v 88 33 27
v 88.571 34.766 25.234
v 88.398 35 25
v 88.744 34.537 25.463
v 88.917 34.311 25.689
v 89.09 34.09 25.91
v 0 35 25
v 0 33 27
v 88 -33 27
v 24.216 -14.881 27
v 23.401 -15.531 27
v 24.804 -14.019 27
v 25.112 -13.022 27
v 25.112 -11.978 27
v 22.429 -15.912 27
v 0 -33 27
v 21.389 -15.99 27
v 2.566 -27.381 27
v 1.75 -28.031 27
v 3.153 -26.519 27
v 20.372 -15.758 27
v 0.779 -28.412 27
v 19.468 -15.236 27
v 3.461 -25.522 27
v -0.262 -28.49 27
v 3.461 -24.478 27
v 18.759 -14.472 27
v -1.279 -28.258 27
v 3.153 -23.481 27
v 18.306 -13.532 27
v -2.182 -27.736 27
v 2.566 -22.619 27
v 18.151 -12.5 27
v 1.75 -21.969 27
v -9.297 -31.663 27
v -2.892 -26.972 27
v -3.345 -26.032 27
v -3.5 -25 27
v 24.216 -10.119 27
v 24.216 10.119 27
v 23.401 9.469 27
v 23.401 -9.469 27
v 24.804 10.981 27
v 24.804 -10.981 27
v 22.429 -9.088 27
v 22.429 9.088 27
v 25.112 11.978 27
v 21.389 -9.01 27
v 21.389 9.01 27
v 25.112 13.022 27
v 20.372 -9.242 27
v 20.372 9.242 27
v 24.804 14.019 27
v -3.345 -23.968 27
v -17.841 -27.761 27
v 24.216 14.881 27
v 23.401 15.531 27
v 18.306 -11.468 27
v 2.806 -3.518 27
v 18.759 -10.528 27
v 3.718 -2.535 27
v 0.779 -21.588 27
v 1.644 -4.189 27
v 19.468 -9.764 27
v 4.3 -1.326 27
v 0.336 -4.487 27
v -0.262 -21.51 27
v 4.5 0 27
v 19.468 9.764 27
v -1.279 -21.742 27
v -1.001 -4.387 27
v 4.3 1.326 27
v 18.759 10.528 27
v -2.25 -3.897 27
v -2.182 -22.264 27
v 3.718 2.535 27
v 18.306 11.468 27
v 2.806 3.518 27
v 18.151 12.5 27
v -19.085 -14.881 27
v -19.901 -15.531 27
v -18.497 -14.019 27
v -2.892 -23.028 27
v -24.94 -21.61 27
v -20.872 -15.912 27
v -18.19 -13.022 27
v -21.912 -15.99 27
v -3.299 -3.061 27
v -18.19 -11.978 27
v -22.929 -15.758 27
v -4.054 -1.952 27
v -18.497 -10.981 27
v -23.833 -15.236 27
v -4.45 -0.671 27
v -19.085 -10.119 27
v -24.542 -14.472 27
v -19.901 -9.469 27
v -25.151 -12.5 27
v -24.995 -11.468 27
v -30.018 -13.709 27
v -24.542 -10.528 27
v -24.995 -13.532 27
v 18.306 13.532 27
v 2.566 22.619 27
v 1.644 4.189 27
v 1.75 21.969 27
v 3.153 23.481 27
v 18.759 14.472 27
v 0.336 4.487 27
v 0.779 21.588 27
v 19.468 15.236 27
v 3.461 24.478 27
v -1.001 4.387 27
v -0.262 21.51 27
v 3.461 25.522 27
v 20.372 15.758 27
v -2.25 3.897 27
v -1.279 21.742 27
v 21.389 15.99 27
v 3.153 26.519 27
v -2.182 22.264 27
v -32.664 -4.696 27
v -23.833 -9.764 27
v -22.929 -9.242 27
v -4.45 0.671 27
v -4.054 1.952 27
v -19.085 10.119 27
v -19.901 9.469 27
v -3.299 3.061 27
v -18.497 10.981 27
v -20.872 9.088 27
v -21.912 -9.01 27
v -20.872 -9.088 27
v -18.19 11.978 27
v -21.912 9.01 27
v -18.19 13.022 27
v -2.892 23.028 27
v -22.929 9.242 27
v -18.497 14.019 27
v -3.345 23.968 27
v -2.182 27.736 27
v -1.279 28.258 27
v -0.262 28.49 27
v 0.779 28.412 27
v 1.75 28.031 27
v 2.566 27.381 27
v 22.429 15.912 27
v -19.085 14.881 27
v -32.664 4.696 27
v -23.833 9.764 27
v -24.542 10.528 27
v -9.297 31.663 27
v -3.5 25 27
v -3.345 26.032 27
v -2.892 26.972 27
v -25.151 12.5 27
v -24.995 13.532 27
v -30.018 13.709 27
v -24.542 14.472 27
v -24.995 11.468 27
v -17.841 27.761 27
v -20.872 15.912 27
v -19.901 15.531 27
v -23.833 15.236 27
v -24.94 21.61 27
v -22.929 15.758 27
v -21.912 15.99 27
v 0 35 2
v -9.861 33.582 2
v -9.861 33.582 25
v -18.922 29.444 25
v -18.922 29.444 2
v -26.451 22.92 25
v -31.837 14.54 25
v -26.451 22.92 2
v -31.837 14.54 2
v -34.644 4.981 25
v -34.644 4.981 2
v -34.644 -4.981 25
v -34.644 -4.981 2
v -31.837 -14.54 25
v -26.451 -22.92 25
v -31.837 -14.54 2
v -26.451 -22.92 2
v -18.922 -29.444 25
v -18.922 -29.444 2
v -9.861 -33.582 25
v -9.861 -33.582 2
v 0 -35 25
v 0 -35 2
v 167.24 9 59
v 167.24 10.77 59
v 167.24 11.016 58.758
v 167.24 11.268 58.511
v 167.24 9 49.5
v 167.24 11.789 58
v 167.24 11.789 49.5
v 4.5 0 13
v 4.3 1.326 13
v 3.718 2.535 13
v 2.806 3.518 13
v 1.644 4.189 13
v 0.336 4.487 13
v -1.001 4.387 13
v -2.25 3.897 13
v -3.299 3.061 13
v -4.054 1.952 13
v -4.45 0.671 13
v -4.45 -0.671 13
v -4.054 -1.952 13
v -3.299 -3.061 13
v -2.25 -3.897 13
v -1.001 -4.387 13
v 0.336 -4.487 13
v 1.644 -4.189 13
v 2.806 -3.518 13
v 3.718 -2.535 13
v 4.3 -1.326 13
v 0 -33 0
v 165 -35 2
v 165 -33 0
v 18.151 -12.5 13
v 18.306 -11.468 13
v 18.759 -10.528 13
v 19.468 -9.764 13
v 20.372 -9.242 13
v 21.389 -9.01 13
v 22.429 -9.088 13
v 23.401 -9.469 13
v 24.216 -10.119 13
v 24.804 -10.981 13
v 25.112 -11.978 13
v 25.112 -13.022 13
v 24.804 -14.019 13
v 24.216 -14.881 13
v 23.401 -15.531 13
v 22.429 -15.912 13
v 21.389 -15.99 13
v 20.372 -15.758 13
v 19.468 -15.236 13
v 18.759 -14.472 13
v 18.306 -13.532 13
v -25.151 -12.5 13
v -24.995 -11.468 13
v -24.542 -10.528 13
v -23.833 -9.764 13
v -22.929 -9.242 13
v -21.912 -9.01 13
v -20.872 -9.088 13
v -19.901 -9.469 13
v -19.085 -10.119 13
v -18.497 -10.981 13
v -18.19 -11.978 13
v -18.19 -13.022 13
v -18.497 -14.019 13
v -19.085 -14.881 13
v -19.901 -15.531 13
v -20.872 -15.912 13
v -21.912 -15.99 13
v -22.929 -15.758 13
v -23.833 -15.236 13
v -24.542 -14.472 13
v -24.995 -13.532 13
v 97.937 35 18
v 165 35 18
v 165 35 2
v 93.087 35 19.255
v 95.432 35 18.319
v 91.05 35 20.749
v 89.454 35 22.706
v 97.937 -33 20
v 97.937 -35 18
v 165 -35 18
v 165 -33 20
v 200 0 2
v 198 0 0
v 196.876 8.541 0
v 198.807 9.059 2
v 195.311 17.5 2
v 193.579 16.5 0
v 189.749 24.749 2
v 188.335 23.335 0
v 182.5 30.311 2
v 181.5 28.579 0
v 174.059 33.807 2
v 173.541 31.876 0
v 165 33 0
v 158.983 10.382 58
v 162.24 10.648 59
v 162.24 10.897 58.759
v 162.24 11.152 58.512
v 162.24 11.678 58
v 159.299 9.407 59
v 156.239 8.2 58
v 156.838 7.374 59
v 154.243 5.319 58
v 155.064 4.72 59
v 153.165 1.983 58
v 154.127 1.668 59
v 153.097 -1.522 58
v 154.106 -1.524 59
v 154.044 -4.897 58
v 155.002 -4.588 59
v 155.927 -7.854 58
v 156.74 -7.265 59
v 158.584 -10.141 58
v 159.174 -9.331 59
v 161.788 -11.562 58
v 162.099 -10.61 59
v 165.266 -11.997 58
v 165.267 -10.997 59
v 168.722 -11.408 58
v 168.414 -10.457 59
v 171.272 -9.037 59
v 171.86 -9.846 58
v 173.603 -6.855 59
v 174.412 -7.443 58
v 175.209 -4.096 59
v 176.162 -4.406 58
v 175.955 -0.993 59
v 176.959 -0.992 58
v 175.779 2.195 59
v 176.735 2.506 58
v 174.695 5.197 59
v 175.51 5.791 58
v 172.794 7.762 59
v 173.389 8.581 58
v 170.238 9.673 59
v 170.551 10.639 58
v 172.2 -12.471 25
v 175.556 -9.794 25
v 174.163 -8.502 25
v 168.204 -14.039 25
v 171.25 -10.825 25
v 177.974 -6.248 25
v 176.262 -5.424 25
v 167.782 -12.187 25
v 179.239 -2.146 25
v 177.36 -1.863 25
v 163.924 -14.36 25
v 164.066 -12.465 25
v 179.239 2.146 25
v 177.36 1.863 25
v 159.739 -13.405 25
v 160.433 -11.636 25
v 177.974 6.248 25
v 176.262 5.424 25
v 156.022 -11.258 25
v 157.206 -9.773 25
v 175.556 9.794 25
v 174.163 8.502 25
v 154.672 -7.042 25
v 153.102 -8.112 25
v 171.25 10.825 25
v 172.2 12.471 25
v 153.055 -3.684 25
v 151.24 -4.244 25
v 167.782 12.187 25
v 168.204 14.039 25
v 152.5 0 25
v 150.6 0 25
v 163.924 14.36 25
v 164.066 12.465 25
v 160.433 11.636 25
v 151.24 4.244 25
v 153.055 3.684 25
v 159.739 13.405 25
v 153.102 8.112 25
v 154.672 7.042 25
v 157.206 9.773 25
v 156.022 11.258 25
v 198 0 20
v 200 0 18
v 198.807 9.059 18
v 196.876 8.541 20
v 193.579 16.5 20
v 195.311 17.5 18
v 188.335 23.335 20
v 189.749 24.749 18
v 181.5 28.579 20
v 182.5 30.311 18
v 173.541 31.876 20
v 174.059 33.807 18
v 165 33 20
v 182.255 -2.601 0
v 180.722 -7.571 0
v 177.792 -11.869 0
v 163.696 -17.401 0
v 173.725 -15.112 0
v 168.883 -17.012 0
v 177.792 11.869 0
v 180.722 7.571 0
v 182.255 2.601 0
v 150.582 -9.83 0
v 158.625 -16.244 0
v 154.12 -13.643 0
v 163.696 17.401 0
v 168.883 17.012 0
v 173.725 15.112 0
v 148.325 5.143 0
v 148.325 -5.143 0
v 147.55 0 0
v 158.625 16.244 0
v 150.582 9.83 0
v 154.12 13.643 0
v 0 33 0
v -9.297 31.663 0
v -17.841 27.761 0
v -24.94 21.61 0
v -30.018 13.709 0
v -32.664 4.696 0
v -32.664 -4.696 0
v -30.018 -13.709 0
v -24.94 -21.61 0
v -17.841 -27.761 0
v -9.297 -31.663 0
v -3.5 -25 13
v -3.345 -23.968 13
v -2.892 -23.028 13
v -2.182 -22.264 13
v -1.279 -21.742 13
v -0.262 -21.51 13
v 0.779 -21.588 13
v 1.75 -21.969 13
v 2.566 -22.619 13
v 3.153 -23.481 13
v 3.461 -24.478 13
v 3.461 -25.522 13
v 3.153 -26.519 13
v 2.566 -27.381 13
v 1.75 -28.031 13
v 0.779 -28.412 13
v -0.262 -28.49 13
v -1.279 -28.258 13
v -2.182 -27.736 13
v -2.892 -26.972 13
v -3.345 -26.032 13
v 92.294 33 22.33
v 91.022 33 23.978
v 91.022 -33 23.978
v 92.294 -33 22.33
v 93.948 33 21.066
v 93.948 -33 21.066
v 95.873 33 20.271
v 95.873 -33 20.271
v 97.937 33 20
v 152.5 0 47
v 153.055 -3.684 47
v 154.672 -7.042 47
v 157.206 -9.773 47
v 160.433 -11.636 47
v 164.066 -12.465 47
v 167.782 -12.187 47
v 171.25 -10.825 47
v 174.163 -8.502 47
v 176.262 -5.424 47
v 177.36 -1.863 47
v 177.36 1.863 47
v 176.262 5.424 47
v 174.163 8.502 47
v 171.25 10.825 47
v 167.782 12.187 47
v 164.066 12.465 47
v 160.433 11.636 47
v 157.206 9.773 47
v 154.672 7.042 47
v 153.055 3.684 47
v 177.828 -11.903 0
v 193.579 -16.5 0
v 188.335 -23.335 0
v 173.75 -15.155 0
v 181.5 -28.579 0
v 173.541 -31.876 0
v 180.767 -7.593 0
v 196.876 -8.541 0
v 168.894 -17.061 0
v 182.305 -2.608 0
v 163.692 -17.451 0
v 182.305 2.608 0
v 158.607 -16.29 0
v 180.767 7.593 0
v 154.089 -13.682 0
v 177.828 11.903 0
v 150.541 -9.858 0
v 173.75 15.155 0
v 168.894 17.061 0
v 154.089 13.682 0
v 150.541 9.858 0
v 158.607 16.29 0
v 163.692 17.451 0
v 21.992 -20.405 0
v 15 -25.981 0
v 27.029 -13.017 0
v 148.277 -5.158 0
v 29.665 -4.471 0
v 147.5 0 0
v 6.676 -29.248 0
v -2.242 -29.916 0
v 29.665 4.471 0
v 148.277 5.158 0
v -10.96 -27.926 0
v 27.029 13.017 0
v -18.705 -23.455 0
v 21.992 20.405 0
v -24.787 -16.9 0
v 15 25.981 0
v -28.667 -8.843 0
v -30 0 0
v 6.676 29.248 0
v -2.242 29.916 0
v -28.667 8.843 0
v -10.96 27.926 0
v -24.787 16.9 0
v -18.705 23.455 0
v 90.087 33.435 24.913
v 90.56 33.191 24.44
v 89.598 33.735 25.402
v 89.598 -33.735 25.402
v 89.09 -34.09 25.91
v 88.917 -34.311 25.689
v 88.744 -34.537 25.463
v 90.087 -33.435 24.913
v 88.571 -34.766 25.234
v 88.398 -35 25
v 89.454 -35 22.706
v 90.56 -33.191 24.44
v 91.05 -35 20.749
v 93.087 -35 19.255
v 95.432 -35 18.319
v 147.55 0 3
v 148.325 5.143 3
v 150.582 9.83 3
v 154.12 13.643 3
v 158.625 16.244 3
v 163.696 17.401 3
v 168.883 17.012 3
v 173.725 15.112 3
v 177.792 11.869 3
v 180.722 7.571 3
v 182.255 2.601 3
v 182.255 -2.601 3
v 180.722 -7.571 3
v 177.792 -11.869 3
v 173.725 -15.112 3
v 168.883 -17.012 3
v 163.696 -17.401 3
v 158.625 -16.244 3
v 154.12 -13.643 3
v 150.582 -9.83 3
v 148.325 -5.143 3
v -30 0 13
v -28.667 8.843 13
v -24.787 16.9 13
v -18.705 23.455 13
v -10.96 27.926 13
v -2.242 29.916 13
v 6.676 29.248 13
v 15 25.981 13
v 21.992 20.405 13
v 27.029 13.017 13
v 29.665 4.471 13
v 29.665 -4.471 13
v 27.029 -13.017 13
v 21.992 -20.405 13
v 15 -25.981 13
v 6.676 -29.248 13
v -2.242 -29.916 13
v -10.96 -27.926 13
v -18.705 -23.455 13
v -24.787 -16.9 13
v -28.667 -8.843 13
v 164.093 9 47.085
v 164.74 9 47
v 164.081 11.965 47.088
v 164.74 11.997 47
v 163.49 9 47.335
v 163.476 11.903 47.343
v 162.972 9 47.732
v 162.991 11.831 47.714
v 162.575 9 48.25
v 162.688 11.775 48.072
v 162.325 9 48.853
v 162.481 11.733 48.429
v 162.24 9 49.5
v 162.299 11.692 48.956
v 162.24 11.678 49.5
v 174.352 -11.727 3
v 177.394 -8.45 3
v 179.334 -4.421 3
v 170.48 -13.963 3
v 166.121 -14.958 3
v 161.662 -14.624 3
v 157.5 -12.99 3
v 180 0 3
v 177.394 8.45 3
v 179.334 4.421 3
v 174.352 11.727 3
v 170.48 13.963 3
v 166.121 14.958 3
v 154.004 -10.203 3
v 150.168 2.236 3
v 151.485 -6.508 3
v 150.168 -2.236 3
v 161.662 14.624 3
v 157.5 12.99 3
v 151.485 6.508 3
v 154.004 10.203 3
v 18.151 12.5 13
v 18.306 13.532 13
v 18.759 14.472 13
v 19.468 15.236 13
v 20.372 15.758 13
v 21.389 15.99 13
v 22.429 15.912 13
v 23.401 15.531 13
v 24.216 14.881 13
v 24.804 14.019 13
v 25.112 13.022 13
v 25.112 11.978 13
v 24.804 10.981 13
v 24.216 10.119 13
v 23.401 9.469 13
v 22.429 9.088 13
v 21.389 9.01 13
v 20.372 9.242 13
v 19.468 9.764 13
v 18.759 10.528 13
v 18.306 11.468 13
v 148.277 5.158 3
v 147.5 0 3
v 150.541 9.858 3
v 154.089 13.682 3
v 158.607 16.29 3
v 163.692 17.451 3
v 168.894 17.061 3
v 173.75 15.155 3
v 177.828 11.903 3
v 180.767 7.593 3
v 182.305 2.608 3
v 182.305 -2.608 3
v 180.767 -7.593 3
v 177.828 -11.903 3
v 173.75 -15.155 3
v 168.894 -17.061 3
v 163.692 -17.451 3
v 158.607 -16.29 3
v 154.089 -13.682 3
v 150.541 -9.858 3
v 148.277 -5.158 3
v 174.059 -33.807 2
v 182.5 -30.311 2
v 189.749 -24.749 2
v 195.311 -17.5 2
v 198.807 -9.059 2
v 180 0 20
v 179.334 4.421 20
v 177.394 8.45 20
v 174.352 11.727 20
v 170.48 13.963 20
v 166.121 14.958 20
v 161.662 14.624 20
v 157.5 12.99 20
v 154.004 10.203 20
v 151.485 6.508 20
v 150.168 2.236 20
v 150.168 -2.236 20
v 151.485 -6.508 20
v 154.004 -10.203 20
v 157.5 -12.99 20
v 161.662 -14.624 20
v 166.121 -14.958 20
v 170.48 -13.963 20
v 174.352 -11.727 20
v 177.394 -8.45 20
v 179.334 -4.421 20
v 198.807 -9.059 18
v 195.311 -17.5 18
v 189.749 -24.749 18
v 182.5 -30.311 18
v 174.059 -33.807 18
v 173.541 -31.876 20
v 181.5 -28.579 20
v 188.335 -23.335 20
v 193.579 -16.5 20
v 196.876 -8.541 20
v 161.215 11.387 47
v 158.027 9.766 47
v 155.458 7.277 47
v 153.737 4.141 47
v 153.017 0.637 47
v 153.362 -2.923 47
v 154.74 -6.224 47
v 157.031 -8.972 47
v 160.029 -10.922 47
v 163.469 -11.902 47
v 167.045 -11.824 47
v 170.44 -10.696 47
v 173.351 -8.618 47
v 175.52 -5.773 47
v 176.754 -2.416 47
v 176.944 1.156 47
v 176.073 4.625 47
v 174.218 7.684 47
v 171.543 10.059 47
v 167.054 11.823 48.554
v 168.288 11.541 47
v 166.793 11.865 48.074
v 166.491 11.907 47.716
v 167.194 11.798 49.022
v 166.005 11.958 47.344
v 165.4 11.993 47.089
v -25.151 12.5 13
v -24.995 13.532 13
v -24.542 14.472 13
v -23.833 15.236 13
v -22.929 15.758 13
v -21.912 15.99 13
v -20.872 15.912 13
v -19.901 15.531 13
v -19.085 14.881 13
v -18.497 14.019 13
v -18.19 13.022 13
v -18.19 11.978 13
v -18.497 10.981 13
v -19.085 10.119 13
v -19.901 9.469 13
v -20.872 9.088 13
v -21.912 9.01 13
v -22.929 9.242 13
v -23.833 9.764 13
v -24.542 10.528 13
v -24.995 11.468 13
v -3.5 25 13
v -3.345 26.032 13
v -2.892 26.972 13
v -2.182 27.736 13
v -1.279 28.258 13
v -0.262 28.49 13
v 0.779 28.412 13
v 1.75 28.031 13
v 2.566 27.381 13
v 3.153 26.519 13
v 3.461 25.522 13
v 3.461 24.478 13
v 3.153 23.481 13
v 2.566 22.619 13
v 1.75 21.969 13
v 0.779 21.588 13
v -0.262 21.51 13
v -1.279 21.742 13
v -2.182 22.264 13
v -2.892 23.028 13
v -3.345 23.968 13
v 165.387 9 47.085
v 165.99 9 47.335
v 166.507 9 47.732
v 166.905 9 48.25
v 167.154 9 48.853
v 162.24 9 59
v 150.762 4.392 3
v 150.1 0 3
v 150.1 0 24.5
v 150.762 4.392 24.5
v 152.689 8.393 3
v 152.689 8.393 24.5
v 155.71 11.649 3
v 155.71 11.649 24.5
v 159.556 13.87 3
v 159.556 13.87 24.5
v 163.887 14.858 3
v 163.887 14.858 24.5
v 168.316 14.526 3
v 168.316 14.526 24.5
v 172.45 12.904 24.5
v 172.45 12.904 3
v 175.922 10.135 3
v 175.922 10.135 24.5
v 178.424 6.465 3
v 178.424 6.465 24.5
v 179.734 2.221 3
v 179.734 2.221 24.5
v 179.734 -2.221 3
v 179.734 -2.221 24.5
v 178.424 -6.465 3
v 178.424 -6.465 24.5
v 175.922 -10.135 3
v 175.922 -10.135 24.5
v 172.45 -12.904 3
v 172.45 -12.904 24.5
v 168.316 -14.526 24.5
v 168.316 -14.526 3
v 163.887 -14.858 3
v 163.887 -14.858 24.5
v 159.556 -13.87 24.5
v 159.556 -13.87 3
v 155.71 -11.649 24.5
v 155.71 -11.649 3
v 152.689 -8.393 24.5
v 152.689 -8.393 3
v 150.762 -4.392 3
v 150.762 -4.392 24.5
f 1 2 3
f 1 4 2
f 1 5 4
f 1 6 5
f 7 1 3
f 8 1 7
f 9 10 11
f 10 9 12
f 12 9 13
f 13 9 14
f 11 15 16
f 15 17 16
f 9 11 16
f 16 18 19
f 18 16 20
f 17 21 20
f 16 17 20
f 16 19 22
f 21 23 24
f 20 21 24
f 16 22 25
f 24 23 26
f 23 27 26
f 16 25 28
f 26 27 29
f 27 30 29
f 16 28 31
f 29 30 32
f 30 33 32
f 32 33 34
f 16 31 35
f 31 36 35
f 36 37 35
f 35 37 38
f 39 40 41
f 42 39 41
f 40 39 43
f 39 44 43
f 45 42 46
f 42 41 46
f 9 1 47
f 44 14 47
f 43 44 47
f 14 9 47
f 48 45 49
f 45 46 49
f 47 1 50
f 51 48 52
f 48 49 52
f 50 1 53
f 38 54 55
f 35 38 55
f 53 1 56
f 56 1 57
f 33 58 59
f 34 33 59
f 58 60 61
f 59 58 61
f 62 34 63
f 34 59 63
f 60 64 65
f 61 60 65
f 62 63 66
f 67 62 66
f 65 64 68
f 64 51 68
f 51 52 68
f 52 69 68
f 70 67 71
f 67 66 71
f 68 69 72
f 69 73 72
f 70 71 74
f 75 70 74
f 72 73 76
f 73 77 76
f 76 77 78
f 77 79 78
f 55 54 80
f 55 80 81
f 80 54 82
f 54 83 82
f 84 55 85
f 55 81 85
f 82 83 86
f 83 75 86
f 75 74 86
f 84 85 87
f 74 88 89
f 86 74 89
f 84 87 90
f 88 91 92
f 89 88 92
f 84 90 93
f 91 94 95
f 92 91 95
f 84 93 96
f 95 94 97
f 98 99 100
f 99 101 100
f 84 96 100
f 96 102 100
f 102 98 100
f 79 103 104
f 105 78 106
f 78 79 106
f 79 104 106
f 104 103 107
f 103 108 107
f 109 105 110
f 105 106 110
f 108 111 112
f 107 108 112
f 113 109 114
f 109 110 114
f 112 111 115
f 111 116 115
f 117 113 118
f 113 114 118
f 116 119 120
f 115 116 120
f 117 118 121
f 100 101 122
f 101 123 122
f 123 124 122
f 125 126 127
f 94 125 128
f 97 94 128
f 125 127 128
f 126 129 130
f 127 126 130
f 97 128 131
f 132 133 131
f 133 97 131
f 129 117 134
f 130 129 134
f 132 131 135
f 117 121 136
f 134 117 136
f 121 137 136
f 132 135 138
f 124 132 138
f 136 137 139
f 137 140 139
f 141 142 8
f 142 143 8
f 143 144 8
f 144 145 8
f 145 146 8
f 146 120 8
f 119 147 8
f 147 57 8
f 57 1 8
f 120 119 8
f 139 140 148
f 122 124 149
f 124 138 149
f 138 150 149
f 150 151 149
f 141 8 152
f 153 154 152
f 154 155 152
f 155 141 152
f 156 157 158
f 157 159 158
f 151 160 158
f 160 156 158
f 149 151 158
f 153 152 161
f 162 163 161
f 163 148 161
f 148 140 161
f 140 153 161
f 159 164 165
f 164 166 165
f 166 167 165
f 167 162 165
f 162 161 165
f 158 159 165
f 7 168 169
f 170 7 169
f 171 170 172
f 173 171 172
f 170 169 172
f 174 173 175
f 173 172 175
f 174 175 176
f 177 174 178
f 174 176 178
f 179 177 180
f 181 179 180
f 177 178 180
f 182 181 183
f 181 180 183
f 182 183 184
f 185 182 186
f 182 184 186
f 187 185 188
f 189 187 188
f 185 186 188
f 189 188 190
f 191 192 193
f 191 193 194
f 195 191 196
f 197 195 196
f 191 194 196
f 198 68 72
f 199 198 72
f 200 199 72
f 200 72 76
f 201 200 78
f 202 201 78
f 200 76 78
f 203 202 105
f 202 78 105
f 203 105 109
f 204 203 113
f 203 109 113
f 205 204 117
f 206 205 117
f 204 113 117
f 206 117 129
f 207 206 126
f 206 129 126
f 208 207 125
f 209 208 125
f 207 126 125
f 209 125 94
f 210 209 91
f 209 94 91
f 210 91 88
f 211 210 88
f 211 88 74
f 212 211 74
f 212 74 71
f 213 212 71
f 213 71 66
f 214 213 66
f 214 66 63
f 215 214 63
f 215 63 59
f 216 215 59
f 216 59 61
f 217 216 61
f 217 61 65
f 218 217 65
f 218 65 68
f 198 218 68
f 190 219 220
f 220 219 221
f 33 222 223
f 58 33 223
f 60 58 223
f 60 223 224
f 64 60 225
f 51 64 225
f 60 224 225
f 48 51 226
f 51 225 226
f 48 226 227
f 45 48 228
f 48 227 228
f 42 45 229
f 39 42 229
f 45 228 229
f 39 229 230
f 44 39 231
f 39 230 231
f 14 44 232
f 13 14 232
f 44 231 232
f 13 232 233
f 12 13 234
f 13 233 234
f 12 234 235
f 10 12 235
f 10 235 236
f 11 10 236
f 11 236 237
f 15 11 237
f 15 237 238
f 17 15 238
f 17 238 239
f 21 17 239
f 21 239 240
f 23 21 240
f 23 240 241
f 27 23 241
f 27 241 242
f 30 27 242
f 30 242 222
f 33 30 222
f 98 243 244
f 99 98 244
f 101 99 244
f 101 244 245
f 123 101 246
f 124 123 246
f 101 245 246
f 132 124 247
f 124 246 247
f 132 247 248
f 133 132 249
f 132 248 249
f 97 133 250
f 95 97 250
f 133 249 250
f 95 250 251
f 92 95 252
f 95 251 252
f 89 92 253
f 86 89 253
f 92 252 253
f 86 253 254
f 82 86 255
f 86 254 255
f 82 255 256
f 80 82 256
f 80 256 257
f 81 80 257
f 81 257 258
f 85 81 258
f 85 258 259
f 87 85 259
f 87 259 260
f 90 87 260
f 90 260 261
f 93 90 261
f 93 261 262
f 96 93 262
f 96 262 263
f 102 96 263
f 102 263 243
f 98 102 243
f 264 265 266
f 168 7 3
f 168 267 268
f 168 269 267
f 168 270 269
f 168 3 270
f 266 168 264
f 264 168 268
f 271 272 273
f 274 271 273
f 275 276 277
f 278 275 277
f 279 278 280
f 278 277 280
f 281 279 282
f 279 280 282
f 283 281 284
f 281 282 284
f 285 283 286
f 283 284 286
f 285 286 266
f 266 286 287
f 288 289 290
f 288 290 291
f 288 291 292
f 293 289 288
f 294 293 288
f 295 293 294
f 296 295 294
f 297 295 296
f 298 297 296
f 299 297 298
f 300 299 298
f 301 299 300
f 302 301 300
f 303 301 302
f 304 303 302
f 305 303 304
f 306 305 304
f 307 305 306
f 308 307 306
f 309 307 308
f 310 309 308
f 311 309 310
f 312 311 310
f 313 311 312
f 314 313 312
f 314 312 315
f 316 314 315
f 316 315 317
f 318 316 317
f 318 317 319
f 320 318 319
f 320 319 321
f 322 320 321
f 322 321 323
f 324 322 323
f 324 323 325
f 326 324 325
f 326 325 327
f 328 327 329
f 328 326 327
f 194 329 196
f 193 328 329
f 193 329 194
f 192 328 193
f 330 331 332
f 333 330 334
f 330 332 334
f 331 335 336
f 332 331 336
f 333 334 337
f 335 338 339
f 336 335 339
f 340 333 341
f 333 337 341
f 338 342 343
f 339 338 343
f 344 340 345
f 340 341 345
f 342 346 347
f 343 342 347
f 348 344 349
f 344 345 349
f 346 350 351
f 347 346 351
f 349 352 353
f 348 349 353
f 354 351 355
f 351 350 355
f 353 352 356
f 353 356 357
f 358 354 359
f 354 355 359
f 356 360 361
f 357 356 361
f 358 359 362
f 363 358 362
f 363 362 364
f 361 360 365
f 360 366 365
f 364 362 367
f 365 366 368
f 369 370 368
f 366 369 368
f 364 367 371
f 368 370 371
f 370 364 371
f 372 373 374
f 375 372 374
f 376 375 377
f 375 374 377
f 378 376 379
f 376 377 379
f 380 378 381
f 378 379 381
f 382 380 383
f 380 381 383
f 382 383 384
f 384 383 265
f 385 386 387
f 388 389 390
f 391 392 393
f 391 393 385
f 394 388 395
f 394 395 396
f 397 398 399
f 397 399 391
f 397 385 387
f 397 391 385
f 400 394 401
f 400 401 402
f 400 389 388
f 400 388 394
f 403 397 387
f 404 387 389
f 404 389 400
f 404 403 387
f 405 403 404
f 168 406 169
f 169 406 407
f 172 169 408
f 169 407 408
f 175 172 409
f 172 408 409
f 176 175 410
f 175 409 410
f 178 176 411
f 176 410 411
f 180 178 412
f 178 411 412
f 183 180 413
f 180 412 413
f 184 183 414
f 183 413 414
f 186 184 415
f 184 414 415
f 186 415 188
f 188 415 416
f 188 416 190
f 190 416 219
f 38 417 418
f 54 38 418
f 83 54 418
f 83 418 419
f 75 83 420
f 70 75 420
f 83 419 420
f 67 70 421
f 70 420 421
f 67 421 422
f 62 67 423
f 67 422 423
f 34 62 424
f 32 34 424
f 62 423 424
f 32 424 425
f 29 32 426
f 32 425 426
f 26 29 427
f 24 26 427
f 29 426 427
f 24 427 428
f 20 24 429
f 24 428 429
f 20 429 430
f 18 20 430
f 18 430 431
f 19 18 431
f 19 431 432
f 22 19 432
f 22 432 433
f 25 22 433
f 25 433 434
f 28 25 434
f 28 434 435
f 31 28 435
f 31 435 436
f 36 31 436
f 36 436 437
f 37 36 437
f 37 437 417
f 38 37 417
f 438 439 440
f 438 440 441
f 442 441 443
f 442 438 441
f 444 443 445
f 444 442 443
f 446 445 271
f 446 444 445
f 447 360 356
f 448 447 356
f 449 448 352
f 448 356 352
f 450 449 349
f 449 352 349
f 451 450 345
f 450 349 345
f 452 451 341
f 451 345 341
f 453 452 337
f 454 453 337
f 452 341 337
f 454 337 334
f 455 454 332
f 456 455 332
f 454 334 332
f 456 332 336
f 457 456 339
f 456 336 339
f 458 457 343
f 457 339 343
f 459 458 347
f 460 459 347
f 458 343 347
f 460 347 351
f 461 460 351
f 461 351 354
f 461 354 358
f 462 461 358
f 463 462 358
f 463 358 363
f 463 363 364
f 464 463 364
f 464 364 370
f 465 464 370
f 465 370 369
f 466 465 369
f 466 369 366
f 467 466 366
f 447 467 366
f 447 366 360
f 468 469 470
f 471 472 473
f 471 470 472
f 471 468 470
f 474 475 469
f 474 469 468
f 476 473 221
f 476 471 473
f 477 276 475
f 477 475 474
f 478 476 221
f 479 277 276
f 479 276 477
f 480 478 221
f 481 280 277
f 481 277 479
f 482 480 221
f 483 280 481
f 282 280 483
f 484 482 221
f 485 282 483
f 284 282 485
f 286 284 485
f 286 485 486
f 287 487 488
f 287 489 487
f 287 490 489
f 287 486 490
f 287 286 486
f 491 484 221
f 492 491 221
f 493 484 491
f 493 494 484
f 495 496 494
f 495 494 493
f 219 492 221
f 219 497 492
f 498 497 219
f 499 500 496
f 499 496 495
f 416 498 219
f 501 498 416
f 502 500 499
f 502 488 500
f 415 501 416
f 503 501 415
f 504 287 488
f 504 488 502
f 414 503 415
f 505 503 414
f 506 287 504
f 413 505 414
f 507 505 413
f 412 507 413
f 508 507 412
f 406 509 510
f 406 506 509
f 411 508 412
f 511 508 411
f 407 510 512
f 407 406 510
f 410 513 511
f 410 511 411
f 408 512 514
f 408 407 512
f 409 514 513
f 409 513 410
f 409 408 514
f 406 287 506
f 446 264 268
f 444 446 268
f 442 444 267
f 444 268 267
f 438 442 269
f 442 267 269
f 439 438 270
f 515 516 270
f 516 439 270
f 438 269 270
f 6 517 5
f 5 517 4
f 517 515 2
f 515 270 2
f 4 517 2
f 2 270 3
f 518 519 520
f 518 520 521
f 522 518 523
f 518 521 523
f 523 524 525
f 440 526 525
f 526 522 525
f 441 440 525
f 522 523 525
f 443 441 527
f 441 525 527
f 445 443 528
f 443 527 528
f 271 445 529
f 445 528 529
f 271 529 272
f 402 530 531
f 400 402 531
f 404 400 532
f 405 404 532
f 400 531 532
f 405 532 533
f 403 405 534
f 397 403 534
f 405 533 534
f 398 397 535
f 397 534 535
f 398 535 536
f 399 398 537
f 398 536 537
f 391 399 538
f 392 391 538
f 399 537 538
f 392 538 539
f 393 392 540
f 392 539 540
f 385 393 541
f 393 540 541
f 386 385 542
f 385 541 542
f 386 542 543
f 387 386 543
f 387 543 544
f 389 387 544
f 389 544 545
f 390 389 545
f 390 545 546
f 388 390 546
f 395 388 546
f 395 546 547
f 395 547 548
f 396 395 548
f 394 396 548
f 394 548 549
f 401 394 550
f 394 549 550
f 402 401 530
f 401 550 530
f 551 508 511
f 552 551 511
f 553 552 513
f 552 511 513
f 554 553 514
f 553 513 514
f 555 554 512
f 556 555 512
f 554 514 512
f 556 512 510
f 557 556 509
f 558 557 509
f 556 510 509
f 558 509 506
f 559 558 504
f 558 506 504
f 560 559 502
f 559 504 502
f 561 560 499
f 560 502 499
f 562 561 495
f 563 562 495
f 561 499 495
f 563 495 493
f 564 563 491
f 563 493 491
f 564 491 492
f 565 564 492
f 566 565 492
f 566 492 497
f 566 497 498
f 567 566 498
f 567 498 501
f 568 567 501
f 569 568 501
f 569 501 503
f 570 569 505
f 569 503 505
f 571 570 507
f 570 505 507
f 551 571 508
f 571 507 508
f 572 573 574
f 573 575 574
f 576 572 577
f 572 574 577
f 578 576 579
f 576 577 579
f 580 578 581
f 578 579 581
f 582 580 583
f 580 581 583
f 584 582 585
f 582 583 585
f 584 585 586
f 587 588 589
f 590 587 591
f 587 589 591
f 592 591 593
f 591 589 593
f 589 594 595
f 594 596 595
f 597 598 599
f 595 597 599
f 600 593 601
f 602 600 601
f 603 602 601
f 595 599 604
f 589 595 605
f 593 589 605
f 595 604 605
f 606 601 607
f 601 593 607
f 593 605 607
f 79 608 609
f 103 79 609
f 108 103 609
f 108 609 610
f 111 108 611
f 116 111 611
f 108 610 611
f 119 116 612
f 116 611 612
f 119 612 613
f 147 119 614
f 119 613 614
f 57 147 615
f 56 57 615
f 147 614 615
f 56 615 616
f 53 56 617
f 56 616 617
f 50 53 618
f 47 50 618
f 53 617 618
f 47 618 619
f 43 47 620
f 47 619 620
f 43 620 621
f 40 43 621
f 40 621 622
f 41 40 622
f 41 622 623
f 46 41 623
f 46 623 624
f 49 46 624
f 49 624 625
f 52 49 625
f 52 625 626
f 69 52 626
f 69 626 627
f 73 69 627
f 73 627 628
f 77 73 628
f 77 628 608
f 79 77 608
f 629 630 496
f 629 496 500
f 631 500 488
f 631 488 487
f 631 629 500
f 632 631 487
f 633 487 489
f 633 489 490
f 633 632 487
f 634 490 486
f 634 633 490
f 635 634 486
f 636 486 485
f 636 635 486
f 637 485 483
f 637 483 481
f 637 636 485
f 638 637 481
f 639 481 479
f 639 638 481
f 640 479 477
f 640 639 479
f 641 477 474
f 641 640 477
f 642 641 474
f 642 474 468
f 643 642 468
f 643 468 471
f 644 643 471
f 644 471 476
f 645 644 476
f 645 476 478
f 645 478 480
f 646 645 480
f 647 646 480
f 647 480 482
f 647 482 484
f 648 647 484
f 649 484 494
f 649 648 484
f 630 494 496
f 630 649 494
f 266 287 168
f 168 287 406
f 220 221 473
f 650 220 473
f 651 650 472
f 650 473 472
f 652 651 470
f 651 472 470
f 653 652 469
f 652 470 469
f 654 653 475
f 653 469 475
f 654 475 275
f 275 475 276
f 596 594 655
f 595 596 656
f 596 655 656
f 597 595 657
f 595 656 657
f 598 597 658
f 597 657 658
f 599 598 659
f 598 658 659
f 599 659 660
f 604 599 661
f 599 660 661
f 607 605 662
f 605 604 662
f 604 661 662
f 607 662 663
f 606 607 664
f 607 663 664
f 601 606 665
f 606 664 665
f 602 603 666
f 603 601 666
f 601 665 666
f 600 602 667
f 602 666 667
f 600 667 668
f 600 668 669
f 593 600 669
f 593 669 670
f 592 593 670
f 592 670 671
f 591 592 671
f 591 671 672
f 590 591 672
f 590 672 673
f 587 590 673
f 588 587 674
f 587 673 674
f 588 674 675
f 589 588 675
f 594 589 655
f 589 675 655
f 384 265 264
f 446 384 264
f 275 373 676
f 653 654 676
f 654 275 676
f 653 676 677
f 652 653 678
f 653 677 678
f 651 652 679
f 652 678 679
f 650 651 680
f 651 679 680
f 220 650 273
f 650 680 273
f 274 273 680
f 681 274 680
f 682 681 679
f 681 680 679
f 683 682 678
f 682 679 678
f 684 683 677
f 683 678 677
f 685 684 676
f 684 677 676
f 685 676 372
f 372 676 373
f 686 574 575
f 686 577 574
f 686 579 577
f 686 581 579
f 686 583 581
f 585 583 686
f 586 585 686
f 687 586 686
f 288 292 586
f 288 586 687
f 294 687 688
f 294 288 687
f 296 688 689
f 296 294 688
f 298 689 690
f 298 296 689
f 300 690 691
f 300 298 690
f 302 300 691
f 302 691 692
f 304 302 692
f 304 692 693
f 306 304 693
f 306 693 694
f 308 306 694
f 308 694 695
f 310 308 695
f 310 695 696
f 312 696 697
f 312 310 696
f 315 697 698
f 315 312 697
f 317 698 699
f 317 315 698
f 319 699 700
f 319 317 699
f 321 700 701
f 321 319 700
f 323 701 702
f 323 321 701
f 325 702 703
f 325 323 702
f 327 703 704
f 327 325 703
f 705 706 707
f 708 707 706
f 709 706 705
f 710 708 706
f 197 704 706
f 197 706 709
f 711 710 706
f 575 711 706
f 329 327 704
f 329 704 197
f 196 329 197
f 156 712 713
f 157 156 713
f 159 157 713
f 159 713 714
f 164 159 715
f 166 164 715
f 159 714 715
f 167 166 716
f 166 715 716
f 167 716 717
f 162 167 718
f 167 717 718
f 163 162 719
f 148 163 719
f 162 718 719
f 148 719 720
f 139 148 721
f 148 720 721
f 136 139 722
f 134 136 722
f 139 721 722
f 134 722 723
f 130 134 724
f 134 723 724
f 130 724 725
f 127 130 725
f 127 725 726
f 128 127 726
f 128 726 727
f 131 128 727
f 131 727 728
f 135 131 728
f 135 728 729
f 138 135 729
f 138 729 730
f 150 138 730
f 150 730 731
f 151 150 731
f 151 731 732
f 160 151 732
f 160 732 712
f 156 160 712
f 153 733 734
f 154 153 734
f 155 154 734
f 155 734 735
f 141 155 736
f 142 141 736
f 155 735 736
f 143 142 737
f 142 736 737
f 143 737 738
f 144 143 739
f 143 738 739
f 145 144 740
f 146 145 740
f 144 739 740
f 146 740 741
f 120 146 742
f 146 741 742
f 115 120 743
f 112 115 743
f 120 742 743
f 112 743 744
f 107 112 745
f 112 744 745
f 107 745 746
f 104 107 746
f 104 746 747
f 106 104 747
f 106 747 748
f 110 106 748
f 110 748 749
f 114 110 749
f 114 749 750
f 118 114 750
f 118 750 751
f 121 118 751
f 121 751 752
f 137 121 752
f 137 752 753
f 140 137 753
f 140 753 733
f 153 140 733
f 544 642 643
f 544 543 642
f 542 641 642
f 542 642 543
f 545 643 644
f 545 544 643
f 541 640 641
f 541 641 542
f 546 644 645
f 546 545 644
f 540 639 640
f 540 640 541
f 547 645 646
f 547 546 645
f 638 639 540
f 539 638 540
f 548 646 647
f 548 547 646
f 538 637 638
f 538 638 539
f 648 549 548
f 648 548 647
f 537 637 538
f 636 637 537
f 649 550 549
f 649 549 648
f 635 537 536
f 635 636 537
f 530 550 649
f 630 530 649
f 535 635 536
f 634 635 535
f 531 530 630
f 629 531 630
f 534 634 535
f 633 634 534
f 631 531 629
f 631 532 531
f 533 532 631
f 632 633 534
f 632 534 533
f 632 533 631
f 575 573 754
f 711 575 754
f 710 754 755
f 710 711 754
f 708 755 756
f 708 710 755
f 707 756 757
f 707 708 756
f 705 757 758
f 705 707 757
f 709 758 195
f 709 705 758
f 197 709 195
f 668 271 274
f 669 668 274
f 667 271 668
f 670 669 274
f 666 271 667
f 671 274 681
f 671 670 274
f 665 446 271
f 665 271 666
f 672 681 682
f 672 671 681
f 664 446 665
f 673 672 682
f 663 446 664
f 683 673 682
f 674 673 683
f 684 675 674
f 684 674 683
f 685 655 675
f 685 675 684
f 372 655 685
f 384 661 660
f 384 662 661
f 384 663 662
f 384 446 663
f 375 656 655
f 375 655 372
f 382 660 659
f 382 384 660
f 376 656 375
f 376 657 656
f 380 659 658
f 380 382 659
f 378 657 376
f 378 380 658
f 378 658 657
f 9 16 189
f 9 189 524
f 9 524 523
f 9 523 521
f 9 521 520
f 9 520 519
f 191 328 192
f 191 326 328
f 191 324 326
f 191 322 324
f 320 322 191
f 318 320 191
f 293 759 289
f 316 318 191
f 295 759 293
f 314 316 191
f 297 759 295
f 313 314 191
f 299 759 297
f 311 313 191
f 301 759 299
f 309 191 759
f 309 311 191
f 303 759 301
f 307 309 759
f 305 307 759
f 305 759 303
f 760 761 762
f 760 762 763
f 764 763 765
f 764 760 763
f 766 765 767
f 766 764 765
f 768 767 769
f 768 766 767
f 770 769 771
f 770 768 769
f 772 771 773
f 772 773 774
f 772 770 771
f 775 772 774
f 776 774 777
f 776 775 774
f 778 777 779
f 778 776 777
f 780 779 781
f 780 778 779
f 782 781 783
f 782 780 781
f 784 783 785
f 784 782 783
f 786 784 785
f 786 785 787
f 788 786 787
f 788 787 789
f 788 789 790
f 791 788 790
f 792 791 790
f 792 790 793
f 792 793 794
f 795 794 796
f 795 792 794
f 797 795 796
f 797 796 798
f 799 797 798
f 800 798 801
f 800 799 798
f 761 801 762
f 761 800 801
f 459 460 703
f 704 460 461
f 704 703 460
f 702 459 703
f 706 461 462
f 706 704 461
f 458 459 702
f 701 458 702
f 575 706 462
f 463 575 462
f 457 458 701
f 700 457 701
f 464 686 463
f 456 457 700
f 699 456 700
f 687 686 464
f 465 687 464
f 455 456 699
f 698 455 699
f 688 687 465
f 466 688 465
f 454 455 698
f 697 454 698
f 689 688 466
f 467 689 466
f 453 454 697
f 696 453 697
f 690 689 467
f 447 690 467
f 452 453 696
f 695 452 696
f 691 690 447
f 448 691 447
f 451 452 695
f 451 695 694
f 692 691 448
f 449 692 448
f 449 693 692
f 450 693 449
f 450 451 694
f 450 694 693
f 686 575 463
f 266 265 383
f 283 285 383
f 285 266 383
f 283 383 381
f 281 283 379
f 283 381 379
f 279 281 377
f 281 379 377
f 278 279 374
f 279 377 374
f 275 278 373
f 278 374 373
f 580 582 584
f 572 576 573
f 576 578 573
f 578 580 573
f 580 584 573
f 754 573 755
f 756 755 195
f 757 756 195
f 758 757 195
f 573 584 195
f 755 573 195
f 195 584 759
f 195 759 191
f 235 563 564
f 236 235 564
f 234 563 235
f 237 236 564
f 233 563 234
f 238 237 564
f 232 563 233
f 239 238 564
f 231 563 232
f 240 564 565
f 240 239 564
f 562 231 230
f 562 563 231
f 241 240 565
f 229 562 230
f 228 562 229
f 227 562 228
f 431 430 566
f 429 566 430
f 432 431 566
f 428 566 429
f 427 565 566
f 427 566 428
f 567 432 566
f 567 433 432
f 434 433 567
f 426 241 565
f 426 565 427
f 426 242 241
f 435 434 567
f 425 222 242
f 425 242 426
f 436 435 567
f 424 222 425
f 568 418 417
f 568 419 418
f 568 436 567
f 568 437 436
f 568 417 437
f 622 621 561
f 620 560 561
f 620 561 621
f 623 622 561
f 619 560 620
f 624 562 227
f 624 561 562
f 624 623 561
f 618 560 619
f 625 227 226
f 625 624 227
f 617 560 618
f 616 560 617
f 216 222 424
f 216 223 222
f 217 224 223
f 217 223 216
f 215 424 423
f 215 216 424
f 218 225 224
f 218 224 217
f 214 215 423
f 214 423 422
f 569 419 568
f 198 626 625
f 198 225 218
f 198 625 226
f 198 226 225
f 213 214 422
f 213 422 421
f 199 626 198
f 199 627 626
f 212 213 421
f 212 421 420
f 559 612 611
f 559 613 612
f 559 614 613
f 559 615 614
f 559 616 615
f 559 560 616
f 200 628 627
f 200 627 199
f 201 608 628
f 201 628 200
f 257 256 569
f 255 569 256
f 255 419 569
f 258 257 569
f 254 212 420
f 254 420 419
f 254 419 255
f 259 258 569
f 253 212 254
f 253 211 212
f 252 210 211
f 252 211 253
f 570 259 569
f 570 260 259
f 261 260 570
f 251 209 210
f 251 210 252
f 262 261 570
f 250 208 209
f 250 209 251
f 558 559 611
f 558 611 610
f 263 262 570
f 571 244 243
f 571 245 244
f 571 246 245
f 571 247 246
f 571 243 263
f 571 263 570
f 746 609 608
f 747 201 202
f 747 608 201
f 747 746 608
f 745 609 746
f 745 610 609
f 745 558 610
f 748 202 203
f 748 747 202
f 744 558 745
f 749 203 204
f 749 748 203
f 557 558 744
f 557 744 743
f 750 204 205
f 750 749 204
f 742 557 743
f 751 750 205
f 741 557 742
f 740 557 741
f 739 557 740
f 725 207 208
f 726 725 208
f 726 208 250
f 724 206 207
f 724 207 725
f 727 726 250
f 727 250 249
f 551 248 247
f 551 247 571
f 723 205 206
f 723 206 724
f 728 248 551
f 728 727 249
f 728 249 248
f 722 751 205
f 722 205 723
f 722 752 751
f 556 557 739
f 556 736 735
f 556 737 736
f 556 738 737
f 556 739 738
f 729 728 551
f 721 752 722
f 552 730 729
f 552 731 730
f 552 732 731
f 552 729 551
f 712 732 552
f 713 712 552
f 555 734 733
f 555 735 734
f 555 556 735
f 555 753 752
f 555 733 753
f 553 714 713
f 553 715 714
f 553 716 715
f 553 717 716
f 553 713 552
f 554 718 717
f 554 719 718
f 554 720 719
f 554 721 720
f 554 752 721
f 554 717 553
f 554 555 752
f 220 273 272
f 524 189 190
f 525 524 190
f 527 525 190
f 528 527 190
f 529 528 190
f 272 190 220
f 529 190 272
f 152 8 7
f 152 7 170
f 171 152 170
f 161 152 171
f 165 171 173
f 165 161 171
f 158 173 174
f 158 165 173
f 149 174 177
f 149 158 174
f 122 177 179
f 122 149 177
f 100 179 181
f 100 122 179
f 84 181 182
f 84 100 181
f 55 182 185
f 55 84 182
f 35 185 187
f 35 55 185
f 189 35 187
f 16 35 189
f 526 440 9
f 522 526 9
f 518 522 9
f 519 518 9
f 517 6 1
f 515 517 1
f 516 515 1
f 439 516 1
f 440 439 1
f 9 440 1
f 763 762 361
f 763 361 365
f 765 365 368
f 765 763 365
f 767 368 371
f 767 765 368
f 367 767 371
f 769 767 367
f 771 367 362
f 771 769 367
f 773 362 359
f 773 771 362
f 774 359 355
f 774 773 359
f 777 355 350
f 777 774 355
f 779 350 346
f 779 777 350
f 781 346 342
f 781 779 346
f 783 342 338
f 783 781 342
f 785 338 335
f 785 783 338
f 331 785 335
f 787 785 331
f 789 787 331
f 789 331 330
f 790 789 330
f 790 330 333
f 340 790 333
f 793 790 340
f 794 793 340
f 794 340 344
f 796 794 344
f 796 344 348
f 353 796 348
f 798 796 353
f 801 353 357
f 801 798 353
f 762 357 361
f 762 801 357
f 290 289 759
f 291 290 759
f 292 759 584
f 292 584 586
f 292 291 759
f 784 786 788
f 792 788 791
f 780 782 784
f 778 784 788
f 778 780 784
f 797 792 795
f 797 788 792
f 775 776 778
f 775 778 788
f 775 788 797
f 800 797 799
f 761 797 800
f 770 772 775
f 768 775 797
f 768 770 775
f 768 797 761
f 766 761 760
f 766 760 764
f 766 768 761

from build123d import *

# Parameters (mm, degrees)
SKETCH_1_R           = 35
EXTRUDE_1_DEPTH      = 27
SKETCH_2_R           = 30
CUT_EXTRUDE_1_DEPTH  = 13
SKETCH_3_R           = 3.5
CUT_EXTRUDE_2_DEPTH  = 18
EXTRUDE_START        = -27
EXTRUDE_3_DEPTH      = 27
SKETCH_6_R           = 4.5
CUT_EXTRUDE_3_DEPTH  = 25
FILLET_2_R           = 35
SKETCH_13_W          = 160
SKETCH_13_H          = 104.985754986
CUT_EXTRUDE_7_DEPTH  = 7
FILLET_4_R           = 8
CHAMFER_1_SIZE       = 2
CHAMFER_2_SIZE       = 2
CHAMFER_3_SIZE       = 2
SKETCH_14_R          = 15
CUT_EXTRUDE_8_DEPTH  = 53
SKETCH_15_R          = 14.9
EXTRUDE_5_DEPTH      = 22
SKETCH_17_R          = 12.5
EXTRUDE_6_DEPTH      = 34
SKETCH_18_R          = 12.5
SKETCH_18_R_2        = 12
CUT_EXTRUDE_9_DEPTH  = 12
CHAMFER_6_SIZE       = 1
CHAMFER_7_SIZE       = 0.5
CUT_EXTRUDE_START    = -3
SKETCH_19_R          = 17.5
SKETCH_19_R_2        = 15
CUT_EXTRUDE_10_DEPTH = 3
SKETCH_20_R          = 17.45
EXTRUDE_7_DEPTH      = 3
SKETCH_21_W          = 5
SKETCH_21_H          = 3
CUT_EXTRUDE_11_DEPTH = 12
FILLET_5_R           = 2.5


# Some blends are built 0.0001 mm under size
with BuildPart() as part:
    # 草图1 → 拉伸1 (new body)
    with BuildSketch(Plane.XY):
        Circle(SKETCH_1_R)
    extrude(amount=EXTRUDE_1_DEPTH)

    # 草图2 → 切除-拉伸1 (cut)
    with BuildSketch(Plane(origin=(0, 0, 0), x_dir=(-1, 0, 0), z_dir=(0, 0, -1))):
        Circle(SKETCH_2_R)
    extrude(amount=-CUT_EXTRUDE_1_DEPTH, mode=Mode.SUBTRACT)

    # 草图3 → 切除-拉伸2 (cut)
    with BuildSketch(Plane(origin=(0, 0, 13), x_dir=(-1, 0, 0), z_dir=(0, 0, -1))):
        with Locations((0, 25)):
            Circle(SKETCH_3_R)
        with Locations((21.650635095, 12.5)):
            Circle(SKETCH_3_R)
        with Locations((21.650635095, -12.5)):
            Circle(SKETCH_3_R)
        with Locations((0, -25)):
            Circle(SKETCH_3_R)
        with Locations((-21.650635095, -12.5)):
            Circle(SKETCH_3_R)
        with Locations((-21.650635095, 12.5)):
            Circle(SKETCH_3_R)
    extrude(amount=-CUT_EXTRUDE_2_DEPTH, mode=Mode.SUBTRACT)

    # 草图5 → 拉伸3 (add)
    with BuildSketch(Plane.XY.offset(27).offset(EXTRUDE_START)):
        with BuildLine():
            Line((0, 35), (150, 35))
            Line((150, 35), (200, 35))
            Line((200, 35), (200, -35))
            Line((200, -35), (150, -35))
            Line((150, -35), (0, -35))
            ThreePointArc((0, -35), (35, 0), (0, 35))
        make_face()
    extrude(amount=EXTRUDE_3_DEPTH)

    # 草图6 → 切除-拉伸3 (cut)
    with BuildSketch(Plane.XY.offset(27)):
        Circle(SKETCH_6_R)
    extrude(amount=-CUT_EXTRUDE_3_DEPTH, mode=Mode.SUBTRACT)

    # 圆角2
    fillet_2_edges = [part.edges().sort_by_distance(p)[0] for p in [
        (200, -35, 13.5),
        (200, 35, 13.5),
    ]]
    fillet(fillet_2_edges, radius=FILLET_2_R - 0.0001)  # a hair under: the kernel refuses the full size

    # 草图13 → 切除-拉伸7 (cut)
    with BuildSketch(Plane.XY.offset(27)):
        with Locations((170, -0.47008547)):
            Rectangle(SKETCH_13_W, SKETCH_13_H)
    extrude(amount=-CUT_EXTRUDE_7_DEPTH, mode=Mode.SUBTRACT)

    # 圆角4
    # the kernel refuses this fillet: 8 mm, written as the material it adds along each edge
    with BuildSketch(Plane(origin=(90, 35, 20), x_dir=(0, 0, 1), z_dir=(0, -1, 0))) as fillet_4_piece_1:
        with BuildLine():
            CenterArc((8, -7.937253933), FILLET_4_R, 97.180755781, 82.819244219)
            Line((0, -7.937253933), (-0.16, -7.937253933))
            Line((-0.16, -7.937253933), (-0.16, 0))
            Line((-0.16, 0), (0, 0.16))
            ThreePointArc((0, 0.16), (3.5, 0.16), (6.98, 0.158745079))
            Line((6.98, 0.158745079), (7, 0))
        make_face()
    extrude(amount=70)

    # 倒角1
    chamfer_1_edges = [part.edges().sort_by_distance(p)[0] for p in [
        (-35, 0, 0),
        (82.50005, -35, 0),
        (82.50005, 35, 0),
        (189.748766631, 24.748766631, 0),
        (189.748766631, -24.748766631, 0),
    ]]
    chamfer(chamfer_1_edges, length=CHAMFER_1_SIZE)

    # 倒角2
    chamfer_2_edges = [part.edges().sort_by_distance(p)[0] for p in [
        (-35, 0, 27),
        (45, -35, 27),
        (189.748766631, -24.748766631, 20),
        (45, 35, 27),
        (189.748766631, 24.748766631, 20),
        (131.468676967, 35, 20),
        (131.468676967, -35, 20),
        (92.645751311, -35, 22),
        (92.645751311, 35, 22),
    ]]
    chamfer(chamfer_2_edges, length=CHAMFER_2_SIZE)

    # 倒角3
    # the kernel refuses this chamfer: 2.306388112, 2 mm, written as the material it takes off along each edge
    with BuildSketch(Plane(origin=(90, 41.181185436, 27), x_dir=(0.3202731013465003, 0, -0.9473252559463905), z_dir=(0, -1, 0))) as chamfer_3_piece_1:
        with BuildLine():
            Line((3.189527355, 0), (-CHAMFER_3_SIZE * 0.320273101347, -CHAMFER_3_SIZE * 0.947325255946))
            Line((-CHAMFER_3_SIZE * 0.320273101347, -CHAMFER_3_SIZE * 0.947325255946), (0, 0))
            ThreePointArc((0, 0), (1.637065861, -0.160453942), (3.189527355, 0))
        make_face()
    extrude(amount=82.362370873, mode=Mode.SUBTRACT)

    # 草图14 → 切除-拉伸8 (cut)
    with BuildSketch(Plane.XY.offset(20)):
        with Locations((165, 0)):
            Circle(SKETCH_14_R)
    extrude(amount=-CUT_EXTRUDE_8_DEPTH, mode=Mode.SUBTRACT)

    # 草图19 → 切除-拉伸10 (cut)
    with BuildSketch(Plane(origin=(0, 0, 0), x_dir=(-1, 0, 0), z_dir=(0, 0, -1)).offset(CUT_EXTRUDE_START)):
        with Locations((-165, 0)):
            Circle(SKETCH_19_R)
        with Locations(Location((-165, 0, 0), (0, 0, 180))):
            Circle(SKETCH_19_R_2, mode=Mode.SUBTRACT)
    extrude(amount=CUT_EXTRUDE_10_DEPTH, mode=Mode.SUBTRACT)

    # 草图20 → 拉伸7 (add)
    with BuildSketch(Plane(origin=(0, 0, 3), x_dir=(-1, 0, 0), z_dir=(0, 0, -1))):
        with Locations((-165, 0)):
            Circle(SKETCH_20_R)
    extrude(amount=EXTRUDE_7_DEPTH)


with BuildPart() as body_2:
    # 草图15 → 拉伸5 (new body)
    with BuildSketch(Plane(origin=(0, 0, 3), x_dir=(-1, 0, 0), z_dir=(0, 0, -1))):
        with Locations((-165, 0)):
            Circle(SKETCH_15_R)
    extrude(amount=-EXTRUDE_5_DEPTH)

    # 草图17 → 拉伸6 (add)
    with BuildSketch(Plane.XY.offset(25)):
        with Locations(Location((165, 0, 0), (0, 0, 180))):
            Circle(SKETCH_17_R)
    extrude(amount=EXTRUDE_6_DEPTH)

    # 草图18 → 切除-拉伸9 (cut)
    with BuildSketch(Plane.XY.offset(59)):
        with Locations(Location((165, 0, 0), (0, 0, 180))):
            Circle(SKETCH_18_R)
        with Locations((165, 0)):
            Circle(SKETCH_18_R_2, mode=Mode.SUBTRACT)
    extrude(amount=-CUT_EXTRUDE_9_DEPTH, mode=Mode.SUBTRACT)

    # 倒角6
    chamfer_6_edges = [body_2.edges().sort_by_distance(p)[0] for p in [
        (153, 0, 59),
    ]]
    chamfer(chamfer_6_edges, length=CHAMFER_6_SIZE)

    # 倒角7
    chamfer_7_edges = [body_2.edges().sort_by_distance(p)[0] for p in [
        (179.9, 0, 25),
    ]]
    chamfer(chamfer_7_edges, length=CHAMFER_7_SIZE)

    # 草图21 → 切除-拉伸11 (cut)
    with BuildSketch(Plane.XY.offset(59)):
        with Locations((164.739676864, 10.5)):
            Rectangle(SKETCH_21_W, SKETCH_21_H)
    extrude(amount=-CUT_EXTRUDE_11_DEPTH, mode=Mode.SUBTRACT)

    # 圆角5
    fillet_5_edges = [body_2.edges().sort_by_distance(p)[0] for p in [
        (167.239676864, 10.394570543, 47),
        (162.239676864, 10.339105586, 47),
    ]]
    fillet(fillet_5_edges, radius=FILLET_5_R - 0.0001)  # a hair under: the kernel refuses the full size


solid = Compound([part.part, body_2.part])
